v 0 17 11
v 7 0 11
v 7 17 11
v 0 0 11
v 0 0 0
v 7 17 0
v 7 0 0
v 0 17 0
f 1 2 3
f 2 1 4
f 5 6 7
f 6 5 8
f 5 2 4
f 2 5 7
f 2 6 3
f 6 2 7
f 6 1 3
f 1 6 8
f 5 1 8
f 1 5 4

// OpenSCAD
// Generated by SolidPython 1.0.1 on 2020-07-29 00:46:55


cube(size = [7, 17, 11]);
/***********************************************
*********      SolidPython code:      **********
************************************************
 
# import packages: SolidPython
from solid import *
from solid.utils import *
from itertools import chain, combinations, permutations


class Resize:

    def __init__(self, scad_file):
        self.scad_file = scad_file
        #self.scad_file = import_scad(scad_file)
        # cone/cylinder param:
        self.r1 = 0
        self.r2 = 0
        self.h = 0
        # rectangular prism param:
        self.w = 0
        self.l = 0
        # ellipse param:
        self.r = 0

    # import OpenScad code (file name corresponds to shape)


    # classify shape + parameters
    def assign(self, param1, param2, param3):
        if self.scad_file == 'cone.scad':
            self.r1 = param1
            self.r2 = param2
            self.h = param3
        elif self.scad_file == 'cylinder.scad':
            self.r1 = param1
            self.r2 = param2
            self.h = param3
        elif self.scad_file == 'rectangularPrism.scad':
            self.h = param1
            self.l = param2
            self.w = param3
        else:
            self.r = param1
            self.h = param2

    # resize parameters
    def iterate(self):
        x = range(3, 20, 2)
        i = 1
        if self.scad_file == 'cone.scad':
            tempList = list(permutations(x, 2))
            for temp in tempList:
                param1 = temp[0]
                param2 = temp[1]
                filepath = 'produced_scad_files/' + 'cone' + str(param1) + '_' + str(param2) + '_' + '.scad'
                scad_render_to_file(cylinder(h=param1, r1=param2, r2=0), filepath)

        elif self.scad_file == 'cylinder.scad':
            tempList = list(permutations(x, 3))
            for temp in tempList:
                param1 = temp[0]
                param2 = temp[1]
                filepath = 'produced_scad_files/' + 'cylinder' + str(param1) + '_' + str(param2) + '_' + '.scad'
                scad_render_to_file(cylinder(h=param1, r1=param2, r2=param2), filepath)

        elif self.scad_file == 'rectangularPrism.scad':
            tempList = list(permutations(x, 3))
            for temp in tempList:
                param1 = temp[0]
                param2 = temp[1]
                param3 = temp[2]
                filepath = 'produced_scad_files/' + 'rectangularPrism' + str(param1) + '_' + str(param2) + '_' + str(
                    param3) + '.scad'
                scad_render_to_file(cube(size=(param1, param2, param3)), filepath)

        elif self.scad_file == 'ellipse.scad':
            tempList = list(permutations(x, 4))
            for temp in tempList:
                param1 = temp[0]
                param2 = temp[1]
                param3 = temp[2]
                param4 = temp[3]
                filepath = 'produced_scad_files/' + 'ellipse' + str(param1) + '_' + str(param2) + '_' + str(param3) + '_' + str(param4) + '.scad'
                scad_render_to_file(scale([param1, param2, param3])(sphere(r=param4)), filepath)

    def render_to_scadfile(self):
        scad_render_to_file(scad, 'example.scad') 
 
************************************************/
